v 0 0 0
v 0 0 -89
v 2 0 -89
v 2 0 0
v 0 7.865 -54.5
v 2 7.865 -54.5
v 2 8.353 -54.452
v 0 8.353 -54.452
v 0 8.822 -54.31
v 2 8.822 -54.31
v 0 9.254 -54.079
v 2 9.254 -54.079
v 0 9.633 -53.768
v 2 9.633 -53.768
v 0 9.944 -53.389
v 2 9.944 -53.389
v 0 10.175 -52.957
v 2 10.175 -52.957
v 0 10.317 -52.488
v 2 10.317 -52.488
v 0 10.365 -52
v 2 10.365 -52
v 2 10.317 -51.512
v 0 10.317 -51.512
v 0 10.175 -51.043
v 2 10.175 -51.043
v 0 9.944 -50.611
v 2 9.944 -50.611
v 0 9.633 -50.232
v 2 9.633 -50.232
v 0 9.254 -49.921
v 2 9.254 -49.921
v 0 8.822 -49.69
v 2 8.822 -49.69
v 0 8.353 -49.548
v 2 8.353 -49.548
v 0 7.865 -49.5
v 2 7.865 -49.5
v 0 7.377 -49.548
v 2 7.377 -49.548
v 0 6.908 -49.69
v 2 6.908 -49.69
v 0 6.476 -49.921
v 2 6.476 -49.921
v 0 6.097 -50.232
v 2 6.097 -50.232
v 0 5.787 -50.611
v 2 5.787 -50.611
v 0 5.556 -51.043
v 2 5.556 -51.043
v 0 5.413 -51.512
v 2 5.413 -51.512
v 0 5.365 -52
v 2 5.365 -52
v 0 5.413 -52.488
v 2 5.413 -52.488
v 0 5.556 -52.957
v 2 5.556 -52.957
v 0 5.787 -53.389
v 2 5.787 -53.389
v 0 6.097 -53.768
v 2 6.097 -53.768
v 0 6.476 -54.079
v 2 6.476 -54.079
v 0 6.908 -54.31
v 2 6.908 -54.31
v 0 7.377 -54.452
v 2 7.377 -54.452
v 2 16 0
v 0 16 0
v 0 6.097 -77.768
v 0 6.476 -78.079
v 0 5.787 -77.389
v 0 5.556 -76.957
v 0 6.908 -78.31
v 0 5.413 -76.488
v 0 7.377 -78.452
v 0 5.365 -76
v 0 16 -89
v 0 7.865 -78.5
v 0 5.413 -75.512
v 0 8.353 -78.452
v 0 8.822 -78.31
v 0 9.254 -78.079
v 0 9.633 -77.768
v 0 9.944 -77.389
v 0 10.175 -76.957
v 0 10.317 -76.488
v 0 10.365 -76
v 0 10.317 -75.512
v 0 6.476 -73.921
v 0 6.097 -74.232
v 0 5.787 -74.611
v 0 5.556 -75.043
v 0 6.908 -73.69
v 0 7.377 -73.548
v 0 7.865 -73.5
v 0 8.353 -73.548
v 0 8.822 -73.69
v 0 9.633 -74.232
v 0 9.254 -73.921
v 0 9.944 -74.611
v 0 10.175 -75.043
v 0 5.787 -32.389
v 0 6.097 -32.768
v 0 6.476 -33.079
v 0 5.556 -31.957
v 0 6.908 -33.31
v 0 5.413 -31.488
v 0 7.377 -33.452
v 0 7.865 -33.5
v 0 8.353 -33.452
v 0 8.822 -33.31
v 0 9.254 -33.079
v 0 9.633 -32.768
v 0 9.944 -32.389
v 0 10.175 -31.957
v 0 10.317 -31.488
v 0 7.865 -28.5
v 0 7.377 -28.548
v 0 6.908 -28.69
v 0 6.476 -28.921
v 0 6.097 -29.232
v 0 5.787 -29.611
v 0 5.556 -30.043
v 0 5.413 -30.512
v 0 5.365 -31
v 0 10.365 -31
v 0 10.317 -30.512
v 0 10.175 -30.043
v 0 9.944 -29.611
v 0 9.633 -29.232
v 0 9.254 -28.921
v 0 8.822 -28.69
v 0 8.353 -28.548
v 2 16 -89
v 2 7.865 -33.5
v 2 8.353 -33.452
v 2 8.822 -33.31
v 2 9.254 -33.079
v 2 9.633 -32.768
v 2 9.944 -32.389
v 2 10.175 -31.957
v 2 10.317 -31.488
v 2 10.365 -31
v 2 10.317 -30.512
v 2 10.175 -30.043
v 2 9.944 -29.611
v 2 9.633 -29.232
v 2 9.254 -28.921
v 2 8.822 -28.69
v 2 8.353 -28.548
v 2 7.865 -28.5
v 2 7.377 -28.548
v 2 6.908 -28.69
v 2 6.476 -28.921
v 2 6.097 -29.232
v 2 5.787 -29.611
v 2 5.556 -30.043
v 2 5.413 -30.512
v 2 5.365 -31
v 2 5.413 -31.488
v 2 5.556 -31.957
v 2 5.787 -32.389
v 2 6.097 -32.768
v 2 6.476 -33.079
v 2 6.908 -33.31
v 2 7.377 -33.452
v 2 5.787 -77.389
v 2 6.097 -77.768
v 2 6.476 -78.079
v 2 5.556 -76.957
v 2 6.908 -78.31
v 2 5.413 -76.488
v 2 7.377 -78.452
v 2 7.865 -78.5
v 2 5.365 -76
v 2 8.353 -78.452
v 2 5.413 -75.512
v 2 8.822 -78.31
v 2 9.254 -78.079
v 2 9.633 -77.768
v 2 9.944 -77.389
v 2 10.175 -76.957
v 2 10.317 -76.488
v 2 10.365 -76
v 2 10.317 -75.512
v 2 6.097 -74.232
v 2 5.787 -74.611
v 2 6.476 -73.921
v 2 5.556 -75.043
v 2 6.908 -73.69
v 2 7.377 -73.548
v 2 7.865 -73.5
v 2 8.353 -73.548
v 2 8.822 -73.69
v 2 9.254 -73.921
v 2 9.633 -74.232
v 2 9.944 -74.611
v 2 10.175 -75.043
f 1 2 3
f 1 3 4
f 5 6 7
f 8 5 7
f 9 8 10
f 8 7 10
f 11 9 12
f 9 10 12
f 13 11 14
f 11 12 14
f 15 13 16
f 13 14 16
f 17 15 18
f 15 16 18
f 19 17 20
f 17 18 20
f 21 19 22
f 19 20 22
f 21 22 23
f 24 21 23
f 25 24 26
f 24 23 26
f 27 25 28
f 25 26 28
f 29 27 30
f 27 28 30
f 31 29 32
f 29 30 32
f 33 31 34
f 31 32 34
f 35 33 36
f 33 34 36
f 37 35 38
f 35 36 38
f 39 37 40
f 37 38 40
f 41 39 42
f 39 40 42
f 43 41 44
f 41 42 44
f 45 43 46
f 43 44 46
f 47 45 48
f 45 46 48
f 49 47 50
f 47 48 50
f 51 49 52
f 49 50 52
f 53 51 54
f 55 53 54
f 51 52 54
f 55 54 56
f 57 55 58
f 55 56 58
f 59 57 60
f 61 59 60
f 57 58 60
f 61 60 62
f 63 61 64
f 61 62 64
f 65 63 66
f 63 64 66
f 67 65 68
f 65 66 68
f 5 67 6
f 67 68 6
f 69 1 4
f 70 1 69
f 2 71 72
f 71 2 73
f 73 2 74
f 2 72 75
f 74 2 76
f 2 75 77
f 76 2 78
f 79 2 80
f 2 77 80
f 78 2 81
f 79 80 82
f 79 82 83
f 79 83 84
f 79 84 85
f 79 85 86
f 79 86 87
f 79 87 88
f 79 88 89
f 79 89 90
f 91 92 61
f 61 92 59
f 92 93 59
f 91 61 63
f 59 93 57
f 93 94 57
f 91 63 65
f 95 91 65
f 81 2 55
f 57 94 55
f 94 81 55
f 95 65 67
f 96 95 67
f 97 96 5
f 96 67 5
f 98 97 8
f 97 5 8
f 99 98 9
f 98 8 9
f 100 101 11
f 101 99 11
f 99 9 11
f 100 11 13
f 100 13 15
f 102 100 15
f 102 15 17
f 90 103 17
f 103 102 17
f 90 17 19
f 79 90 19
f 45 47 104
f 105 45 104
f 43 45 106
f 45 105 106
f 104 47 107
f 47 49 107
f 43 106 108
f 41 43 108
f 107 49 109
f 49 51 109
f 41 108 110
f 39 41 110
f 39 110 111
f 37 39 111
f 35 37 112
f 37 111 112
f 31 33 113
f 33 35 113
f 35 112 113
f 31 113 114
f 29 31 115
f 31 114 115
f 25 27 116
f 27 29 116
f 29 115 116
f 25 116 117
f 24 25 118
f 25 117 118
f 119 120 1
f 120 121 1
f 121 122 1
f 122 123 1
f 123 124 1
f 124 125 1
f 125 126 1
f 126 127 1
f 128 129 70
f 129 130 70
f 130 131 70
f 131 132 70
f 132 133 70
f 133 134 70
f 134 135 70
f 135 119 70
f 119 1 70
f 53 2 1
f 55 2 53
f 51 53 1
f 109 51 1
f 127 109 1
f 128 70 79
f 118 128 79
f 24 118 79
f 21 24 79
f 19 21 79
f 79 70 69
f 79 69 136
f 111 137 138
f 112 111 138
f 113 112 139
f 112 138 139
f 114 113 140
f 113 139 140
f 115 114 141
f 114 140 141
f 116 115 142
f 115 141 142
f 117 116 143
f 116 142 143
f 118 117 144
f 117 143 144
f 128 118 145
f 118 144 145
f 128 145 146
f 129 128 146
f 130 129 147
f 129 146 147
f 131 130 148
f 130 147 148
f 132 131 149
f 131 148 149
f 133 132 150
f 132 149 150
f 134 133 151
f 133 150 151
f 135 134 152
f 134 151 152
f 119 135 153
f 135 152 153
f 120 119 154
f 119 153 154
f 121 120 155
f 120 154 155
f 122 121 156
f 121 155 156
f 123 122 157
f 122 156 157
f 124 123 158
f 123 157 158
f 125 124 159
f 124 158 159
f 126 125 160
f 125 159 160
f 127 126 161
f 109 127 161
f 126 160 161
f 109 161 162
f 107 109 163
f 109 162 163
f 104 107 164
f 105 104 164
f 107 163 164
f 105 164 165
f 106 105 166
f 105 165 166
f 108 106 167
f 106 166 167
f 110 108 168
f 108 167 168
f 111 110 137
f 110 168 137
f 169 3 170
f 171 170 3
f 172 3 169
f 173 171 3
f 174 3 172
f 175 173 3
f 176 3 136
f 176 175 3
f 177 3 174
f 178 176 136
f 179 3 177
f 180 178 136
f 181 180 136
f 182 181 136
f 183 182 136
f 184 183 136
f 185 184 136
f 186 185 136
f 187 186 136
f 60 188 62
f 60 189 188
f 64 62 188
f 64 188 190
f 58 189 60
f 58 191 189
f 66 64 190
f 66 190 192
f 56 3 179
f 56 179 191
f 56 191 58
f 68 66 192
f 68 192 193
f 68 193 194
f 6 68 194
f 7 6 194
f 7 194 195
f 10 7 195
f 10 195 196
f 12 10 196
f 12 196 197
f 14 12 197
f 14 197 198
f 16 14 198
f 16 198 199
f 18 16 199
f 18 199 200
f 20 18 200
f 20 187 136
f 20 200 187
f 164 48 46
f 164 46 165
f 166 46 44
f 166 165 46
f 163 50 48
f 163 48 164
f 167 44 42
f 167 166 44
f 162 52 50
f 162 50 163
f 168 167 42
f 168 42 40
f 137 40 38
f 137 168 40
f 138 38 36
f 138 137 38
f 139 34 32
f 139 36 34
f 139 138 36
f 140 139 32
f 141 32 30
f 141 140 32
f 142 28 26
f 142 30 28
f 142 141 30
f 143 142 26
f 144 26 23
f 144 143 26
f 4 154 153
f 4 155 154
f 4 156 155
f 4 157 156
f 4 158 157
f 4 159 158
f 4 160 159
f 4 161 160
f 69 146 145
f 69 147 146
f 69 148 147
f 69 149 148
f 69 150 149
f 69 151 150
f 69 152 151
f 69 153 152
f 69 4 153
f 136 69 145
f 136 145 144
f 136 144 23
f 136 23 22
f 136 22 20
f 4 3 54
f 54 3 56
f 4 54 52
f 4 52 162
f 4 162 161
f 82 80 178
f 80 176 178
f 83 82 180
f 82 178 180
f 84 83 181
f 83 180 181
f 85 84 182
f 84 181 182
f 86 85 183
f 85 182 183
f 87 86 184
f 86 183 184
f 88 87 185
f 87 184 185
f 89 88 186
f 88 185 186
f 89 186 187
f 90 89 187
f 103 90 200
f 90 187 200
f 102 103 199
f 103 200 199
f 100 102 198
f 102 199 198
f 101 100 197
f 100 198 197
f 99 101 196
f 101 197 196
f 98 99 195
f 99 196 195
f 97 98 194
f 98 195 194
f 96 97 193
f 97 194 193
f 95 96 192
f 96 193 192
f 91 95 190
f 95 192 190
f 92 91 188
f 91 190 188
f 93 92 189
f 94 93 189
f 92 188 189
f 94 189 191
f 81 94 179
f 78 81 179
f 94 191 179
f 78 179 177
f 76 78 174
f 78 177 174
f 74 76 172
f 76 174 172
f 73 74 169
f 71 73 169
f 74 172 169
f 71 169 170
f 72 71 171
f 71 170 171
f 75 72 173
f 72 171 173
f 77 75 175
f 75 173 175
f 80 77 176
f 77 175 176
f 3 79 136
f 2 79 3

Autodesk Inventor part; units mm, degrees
ref_plane "YZ Plane" through (0, 0, 0) normal (1, 0, 0) x (0, 1, 0)
ref_plane "XZ Plane" through (0, 0, 0) normal (0, 1, 0) x (-1, 0, 0)
ref_plane "XY Plane" through (0, 0, 0) normal (0, 0, 1) x (1, 0, 0)
sketch "Sketch1" plane through (0, 0, 0) normal (1, 0, 0) x (0, 1, 0)
  line L0 (0, 0) -> (16, 0)
  line L1 (16, 0) -> (16, -89)
  line L2 (16, -89) -> (0, -89)
  line L3 (0, -89) -> (0, 0)
  dimension "d0" = 16
  dimension "d1" = 89
extrude "Extrusion1" add sketch "Sketch1" along normal blind 2
sketch "Sketch2" plane through (2, 0, 0) normal (1, 0, 0) x (0, 0, -1)
  circle A0 centre (76.5, 8.5) radius 1 projected
  circle A1 centre (52, 7.8652) radius 2.5 projected
  circle A2 centre (31, 7.8652) radius 2.5 projected
  circle A3 centre (31, 7.8652) radius 2.5
  circle A4 centre (52, 7.8652) radius 2.5
  circle A5 centre (76.1279, 7.6338) radius 2.5 projected
  line L0 (31, 7.8652) -> (88.1089, 7.8652) construction
  circle A6 centre (76, 7.8652) radius 2.5
  point P0 (0, 0)
  dimension "d4" = 5
  dimension "d5" = 5
  dimension "d6" = 5
  dimension "d9" = 21
  dimension "d10" = 24
extrude "Extrusion2" cut sketch "Sketch2" against normal blind 2 contours A1 | A2 | A6 A5 | A5 A6 picked at (74.9617, 6.4955) picked at (74.7573, 9.9128)
sketch "Sketch3" plane through (2, 8.5, -76.5) normal (1, 0, 0) x (0, 0, -1)
  circle A0 centre (0, 0) radius 1.1582
  point P0 (-76.5, -8.5)
extrude "Extrusion3" cut sketch "Sketch3" against normal blind 10
properties part number "Gear-wall-motor-side"
